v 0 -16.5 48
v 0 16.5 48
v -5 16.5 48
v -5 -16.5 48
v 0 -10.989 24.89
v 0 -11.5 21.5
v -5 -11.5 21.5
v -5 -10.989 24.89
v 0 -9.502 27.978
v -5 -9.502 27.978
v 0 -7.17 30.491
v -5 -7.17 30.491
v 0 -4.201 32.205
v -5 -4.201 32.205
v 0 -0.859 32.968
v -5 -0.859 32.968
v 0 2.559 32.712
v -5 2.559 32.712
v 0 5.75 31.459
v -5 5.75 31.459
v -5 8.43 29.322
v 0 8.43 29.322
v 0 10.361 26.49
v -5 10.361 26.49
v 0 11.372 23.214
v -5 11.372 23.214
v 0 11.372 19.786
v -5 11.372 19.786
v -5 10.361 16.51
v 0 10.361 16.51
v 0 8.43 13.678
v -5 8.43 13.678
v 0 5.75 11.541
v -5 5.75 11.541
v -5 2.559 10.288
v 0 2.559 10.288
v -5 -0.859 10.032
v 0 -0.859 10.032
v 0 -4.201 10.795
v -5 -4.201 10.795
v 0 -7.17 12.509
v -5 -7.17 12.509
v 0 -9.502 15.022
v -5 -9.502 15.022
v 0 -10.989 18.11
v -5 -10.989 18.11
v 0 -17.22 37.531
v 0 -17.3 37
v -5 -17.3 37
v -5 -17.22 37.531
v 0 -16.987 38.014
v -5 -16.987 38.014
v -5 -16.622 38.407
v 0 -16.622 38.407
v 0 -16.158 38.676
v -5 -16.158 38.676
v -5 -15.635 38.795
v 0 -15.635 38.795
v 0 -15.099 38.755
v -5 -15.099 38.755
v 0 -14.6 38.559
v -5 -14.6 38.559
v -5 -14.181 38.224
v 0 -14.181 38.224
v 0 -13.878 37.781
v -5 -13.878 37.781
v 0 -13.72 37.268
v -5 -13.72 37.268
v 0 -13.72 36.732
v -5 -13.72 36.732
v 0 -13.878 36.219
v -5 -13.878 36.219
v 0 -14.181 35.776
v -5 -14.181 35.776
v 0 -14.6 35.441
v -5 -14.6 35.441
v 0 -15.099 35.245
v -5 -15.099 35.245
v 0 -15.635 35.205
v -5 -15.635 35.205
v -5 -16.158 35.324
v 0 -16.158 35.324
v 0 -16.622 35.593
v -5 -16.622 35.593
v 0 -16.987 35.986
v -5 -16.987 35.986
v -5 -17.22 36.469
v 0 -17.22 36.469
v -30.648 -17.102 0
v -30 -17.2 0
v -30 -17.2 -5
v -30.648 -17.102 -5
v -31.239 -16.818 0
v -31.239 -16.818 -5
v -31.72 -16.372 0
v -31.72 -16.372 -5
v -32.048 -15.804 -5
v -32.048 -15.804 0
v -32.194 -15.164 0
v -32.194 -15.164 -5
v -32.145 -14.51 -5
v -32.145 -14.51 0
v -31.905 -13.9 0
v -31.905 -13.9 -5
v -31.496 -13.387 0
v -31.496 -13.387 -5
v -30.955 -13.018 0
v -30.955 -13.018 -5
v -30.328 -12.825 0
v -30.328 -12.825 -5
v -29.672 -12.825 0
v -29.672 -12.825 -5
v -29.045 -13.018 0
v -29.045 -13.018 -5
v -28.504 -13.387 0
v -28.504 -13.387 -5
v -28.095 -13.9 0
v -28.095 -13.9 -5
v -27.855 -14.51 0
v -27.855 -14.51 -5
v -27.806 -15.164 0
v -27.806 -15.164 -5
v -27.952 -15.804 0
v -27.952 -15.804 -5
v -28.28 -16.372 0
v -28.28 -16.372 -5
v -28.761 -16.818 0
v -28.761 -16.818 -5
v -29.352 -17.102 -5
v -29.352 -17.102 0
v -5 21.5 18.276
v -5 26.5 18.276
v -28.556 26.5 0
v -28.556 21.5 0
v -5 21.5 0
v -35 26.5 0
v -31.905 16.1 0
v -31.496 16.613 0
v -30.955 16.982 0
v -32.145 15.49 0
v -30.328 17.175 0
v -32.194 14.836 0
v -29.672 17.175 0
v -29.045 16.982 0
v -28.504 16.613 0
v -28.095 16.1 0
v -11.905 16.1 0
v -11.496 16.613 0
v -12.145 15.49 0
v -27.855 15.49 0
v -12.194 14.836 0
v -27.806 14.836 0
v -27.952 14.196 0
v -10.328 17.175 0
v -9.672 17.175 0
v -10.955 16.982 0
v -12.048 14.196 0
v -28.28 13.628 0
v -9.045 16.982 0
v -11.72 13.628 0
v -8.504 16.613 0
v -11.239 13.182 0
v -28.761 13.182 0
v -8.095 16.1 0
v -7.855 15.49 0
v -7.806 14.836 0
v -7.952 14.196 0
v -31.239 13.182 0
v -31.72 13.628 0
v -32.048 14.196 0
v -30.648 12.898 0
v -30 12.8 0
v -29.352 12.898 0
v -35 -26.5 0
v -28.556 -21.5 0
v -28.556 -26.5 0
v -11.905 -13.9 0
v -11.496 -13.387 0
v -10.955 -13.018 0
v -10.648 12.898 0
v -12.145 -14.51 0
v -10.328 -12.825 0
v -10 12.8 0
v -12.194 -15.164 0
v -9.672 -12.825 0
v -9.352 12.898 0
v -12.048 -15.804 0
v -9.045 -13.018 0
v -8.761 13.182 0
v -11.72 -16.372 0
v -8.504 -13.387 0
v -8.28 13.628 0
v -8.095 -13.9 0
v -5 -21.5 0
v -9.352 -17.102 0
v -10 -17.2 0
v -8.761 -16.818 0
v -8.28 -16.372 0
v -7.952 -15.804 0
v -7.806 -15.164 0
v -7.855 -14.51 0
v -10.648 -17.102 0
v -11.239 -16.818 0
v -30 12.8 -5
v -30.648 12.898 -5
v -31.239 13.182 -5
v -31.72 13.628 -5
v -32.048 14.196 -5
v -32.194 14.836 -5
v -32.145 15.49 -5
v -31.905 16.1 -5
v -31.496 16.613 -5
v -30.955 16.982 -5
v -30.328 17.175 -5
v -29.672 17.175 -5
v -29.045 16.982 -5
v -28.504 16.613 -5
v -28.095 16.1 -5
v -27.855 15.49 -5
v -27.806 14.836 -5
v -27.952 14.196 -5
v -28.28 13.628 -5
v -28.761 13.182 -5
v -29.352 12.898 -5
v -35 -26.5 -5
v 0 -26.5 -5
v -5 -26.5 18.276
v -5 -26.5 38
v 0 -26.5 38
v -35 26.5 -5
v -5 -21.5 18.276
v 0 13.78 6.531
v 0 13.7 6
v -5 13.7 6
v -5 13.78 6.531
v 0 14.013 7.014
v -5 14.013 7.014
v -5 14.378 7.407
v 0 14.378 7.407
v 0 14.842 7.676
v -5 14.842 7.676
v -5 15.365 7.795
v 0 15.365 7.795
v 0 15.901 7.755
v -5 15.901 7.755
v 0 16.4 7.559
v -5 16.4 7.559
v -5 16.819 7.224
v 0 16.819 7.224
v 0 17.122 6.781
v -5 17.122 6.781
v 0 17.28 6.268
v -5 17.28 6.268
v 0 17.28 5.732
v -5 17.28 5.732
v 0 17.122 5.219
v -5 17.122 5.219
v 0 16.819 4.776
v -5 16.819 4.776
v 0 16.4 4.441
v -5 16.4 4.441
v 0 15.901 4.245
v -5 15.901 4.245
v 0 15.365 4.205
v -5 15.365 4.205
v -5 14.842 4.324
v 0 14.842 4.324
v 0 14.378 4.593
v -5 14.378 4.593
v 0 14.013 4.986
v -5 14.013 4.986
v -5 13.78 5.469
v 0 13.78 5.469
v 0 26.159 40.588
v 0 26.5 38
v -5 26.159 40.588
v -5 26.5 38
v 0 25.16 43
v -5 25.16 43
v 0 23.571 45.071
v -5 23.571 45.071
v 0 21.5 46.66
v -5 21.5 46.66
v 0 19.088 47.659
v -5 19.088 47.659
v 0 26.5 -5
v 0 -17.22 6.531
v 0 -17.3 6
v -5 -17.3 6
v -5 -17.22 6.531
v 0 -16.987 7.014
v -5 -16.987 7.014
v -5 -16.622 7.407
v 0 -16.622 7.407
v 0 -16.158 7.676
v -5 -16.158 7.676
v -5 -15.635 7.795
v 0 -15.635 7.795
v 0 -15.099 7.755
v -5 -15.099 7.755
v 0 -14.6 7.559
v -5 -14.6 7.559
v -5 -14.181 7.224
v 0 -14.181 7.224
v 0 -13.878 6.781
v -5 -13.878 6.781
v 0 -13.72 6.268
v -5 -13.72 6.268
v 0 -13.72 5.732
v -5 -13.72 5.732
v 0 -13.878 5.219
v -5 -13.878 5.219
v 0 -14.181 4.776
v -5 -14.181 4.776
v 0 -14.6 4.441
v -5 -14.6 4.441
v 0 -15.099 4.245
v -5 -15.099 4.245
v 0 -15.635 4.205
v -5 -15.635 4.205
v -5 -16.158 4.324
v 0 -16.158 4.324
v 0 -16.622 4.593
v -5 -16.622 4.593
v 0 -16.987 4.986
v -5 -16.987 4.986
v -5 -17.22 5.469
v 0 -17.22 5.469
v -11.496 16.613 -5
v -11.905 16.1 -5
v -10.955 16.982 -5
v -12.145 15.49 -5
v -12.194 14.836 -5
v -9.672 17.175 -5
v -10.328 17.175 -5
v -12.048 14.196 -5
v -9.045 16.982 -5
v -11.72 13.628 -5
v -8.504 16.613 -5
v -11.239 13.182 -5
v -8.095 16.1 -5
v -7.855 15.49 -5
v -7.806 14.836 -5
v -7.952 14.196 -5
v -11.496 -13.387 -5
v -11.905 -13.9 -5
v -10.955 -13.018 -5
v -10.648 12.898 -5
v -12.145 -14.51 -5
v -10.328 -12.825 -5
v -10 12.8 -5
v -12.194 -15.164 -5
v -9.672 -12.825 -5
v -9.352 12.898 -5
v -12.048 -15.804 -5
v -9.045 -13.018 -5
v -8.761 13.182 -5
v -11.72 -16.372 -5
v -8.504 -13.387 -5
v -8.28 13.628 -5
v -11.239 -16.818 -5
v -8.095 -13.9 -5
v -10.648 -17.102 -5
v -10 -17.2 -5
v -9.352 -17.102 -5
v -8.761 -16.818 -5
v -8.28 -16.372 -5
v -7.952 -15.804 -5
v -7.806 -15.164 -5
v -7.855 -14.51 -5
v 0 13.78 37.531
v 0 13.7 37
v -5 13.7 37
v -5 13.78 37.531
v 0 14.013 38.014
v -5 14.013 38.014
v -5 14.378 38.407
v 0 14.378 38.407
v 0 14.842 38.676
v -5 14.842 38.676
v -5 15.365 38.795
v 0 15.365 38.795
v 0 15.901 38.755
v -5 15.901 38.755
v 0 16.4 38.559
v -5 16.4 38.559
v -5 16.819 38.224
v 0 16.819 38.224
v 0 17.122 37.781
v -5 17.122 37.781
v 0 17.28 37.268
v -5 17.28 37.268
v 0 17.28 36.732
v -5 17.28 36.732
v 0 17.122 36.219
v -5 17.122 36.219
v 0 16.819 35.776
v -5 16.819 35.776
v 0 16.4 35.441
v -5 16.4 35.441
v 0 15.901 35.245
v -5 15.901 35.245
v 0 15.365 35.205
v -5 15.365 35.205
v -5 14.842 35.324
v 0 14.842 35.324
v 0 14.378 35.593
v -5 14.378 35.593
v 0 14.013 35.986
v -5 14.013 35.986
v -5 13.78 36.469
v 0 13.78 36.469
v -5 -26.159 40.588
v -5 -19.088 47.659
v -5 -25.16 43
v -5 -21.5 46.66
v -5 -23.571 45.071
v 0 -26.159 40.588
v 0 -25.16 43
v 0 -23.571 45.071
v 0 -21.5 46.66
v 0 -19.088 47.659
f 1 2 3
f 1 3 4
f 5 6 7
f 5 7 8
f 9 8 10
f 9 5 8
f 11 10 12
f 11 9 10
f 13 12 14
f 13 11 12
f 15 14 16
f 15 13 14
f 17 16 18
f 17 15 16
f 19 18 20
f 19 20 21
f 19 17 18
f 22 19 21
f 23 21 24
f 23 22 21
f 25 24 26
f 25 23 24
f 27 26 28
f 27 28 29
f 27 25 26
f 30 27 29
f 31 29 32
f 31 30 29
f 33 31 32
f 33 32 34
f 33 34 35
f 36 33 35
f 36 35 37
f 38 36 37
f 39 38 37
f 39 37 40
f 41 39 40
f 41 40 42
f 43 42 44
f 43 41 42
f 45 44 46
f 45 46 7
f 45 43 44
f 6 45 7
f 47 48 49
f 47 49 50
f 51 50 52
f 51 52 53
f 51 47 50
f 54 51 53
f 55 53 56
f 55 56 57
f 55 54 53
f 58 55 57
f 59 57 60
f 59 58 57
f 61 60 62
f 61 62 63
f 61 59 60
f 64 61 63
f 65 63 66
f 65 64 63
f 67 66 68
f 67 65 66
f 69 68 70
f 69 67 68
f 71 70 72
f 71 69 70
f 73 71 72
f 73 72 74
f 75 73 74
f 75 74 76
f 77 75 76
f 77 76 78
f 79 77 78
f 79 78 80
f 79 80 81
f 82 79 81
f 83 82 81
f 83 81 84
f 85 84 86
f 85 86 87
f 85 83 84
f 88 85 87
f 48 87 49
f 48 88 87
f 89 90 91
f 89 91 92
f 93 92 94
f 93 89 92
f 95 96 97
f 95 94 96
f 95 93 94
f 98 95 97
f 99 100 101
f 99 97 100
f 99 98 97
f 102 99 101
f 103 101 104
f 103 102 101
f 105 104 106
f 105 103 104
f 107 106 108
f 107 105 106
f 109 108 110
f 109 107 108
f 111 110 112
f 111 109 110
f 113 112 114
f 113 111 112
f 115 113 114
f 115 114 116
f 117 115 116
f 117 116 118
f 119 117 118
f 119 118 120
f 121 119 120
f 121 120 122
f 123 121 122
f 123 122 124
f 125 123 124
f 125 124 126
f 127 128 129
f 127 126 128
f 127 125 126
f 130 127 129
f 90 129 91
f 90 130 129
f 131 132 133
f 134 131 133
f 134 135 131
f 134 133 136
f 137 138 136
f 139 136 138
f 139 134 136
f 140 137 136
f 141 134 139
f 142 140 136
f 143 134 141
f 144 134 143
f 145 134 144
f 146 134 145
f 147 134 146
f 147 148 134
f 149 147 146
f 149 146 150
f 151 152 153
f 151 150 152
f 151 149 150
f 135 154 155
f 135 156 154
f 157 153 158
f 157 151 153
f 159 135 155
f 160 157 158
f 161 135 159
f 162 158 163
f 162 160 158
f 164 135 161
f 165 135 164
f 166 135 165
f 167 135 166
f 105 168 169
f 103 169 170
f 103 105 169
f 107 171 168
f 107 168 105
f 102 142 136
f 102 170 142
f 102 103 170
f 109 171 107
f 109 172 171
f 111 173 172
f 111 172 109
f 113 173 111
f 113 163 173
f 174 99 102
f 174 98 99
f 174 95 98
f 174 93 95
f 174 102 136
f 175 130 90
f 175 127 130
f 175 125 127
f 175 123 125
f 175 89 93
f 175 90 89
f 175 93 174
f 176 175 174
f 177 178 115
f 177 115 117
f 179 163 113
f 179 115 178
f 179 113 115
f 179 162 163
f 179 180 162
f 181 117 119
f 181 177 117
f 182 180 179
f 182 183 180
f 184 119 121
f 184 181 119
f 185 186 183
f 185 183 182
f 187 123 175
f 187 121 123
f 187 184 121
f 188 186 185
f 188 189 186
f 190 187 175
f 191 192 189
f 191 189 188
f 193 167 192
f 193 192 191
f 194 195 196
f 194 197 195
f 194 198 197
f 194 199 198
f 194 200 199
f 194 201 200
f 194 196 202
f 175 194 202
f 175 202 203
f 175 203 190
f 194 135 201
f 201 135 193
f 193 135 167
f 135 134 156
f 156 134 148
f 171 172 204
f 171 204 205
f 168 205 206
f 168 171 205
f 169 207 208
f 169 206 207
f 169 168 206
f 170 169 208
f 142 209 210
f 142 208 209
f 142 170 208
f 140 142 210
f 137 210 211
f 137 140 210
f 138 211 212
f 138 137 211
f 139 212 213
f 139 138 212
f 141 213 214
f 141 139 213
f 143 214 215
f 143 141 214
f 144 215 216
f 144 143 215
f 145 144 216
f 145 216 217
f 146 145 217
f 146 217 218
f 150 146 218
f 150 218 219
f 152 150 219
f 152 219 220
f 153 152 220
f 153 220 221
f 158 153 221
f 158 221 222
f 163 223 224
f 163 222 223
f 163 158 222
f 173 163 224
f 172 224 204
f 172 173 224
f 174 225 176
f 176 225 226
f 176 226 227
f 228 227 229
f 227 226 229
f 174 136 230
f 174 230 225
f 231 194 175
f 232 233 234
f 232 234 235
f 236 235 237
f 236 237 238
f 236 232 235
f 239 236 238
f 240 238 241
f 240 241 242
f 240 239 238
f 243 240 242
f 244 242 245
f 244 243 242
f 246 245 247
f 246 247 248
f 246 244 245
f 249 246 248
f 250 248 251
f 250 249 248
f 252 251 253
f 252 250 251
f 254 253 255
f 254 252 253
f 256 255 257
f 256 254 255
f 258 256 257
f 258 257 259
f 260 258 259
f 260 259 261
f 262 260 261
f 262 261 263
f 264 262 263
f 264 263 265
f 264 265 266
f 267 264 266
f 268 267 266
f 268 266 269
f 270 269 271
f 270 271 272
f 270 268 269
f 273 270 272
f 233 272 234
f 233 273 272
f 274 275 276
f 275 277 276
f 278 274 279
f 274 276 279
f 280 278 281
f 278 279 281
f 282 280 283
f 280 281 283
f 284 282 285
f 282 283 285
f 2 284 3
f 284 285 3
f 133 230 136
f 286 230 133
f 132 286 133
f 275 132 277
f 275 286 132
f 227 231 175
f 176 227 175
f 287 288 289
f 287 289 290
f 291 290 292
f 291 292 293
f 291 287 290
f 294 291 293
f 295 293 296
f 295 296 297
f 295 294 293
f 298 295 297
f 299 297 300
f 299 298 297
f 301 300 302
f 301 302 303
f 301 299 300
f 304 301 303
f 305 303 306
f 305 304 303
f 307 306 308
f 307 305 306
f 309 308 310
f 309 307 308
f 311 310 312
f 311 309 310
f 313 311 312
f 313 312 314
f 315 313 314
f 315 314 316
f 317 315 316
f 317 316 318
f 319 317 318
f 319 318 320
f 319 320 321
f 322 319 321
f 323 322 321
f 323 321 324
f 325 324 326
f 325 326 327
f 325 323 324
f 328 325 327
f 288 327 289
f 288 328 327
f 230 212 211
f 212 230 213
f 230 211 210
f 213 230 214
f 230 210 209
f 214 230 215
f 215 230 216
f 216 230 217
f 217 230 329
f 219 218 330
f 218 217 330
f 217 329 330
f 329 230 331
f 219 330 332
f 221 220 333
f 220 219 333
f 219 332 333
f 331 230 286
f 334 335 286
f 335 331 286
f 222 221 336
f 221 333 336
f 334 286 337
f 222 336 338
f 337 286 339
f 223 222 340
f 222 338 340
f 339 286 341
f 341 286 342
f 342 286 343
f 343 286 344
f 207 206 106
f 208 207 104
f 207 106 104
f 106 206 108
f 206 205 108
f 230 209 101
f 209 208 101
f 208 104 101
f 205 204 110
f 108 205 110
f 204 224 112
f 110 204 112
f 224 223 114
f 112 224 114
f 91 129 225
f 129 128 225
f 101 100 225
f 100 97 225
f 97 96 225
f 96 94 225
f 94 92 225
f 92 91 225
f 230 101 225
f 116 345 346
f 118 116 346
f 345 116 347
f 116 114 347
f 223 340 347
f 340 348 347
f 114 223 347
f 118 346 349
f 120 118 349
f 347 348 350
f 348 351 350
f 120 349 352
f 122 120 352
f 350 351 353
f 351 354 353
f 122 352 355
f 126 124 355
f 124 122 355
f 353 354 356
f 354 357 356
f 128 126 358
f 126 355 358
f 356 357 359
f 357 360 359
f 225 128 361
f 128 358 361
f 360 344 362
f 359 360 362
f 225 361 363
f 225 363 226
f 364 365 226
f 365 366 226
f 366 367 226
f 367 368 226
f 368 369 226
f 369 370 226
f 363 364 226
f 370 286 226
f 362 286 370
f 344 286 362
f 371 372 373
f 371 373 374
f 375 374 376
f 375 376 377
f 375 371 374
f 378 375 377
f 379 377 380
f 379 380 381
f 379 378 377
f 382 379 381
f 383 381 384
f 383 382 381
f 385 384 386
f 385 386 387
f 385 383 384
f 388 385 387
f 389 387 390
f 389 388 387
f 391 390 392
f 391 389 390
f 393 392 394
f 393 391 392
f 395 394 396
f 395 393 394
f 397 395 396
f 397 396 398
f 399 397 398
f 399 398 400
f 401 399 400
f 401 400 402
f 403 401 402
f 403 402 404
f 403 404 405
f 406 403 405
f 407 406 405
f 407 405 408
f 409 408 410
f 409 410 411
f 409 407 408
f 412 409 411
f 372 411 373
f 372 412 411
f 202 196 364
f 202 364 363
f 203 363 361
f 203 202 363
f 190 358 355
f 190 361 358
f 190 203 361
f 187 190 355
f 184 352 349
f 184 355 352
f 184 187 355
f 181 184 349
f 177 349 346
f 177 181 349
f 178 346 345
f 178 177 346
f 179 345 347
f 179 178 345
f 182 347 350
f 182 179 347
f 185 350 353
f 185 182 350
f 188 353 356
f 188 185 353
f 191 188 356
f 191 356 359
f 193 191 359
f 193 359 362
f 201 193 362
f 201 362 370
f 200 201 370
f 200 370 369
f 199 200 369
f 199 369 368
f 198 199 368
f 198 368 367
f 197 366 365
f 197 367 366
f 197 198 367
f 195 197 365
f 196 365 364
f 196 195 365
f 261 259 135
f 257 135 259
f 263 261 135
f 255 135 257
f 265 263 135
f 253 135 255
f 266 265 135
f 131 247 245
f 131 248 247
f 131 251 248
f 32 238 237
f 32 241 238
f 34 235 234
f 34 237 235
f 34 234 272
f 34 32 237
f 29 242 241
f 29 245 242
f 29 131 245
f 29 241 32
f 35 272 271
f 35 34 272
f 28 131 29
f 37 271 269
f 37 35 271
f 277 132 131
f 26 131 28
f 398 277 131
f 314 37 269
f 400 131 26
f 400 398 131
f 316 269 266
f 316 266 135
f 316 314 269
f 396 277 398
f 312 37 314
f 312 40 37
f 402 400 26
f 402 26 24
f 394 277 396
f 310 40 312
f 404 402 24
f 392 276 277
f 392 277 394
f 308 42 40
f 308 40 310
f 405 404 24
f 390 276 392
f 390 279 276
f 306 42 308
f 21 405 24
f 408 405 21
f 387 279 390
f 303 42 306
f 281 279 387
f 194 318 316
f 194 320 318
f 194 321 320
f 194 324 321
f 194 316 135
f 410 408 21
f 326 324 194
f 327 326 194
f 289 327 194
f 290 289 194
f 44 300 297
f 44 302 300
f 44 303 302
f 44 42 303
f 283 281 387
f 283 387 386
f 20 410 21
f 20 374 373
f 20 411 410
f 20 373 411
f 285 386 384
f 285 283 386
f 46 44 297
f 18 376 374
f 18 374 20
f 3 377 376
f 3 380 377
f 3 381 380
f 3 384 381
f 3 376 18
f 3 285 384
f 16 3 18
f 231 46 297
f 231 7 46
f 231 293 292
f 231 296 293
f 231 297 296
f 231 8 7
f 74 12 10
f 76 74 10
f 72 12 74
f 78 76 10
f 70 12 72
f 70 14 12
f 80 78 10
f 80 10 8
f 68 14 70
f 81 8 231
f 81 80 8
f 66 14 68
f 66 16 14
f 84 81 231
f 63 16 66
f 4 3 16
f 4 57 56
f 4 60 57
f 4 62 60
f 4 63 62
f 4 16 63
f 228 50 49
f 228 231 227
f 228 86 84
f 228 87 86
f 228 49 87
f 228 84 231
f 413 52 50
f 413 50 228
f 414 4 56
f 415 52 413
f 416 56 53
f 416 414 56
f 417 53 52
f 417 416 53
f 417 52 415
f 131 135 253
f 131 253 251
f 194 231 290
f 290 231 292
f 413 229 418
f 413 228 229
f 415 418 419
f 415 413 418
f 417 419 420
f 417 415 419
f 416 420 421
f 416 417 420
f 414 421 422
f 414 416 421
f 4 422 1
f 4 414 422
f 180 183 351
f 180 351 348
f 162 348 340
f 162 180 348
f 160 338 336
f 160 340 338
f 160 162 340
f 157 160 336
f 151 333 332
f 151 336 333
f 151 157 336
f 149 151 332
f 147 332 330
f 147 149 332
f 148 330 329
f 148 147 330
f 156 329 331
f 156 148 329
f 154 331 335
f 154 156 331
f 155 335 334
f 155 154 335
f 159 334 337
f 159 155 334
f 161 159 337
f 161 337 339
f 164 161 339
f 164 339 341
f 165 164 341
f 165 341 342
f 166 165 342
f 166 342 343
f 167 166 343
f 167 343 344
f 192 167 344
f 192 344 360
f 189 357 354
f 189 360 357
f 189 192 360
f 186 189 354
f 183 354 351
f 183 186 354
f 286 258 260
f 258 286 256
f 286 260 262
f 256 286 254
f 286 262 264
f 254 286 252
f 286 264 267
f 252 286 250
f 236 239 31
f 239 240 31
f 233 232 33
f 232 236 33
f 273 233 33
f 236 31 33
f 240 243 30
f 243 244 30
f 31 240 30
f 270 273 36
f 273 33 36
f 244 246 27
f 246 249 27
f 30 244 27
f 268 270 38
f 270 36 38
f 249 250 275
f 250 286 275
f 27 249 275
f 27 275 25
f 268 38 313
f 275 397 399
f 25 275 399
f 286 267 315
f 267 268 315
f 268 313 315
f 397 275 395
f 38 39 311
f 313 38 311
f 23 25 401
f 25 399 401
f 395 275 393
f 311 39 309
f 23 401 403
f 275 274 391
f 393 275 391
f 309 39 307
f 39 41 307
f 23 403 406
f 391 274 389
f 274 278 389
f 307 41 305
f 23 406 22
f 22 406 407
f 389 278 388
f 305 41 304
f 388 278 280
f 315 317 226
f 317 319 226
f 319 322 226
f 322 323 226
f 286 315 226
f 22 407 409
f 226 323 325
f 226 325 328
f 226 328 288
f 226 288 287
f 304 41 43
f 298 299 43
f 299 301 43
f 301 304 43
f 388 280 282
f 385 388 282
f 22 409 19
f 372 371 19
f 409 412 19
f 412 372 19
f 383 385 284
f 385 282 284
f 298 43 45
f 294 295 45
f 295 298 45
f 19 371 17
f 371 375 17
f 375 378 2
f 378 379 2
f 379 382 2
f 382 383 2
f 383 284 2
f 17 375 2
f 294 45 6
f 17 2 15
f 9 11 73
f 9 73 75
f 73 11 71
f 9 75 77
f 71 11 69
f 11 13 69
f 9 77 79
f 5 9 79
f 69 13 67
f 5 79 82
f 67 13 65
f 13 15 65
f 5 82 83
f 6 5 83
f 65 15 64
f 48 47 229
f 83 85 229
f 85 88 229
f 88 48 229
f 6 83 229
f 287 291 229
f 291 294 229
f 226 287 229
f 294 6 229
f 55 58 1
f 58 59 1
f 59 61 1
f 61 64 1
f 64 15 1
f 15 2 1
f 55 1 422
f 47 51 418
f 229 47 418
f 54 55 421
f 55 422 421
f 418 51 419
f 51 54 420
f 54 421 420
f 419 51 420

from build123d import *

# Parameters (mm, degrees)
CYLINDER098_R          = 1.8
CYLINDER098_DEPTH      = 5
ARRAY001_X_COUNT       = 2
ARRAY001_X_PITCH       = 31
ARRAY001_Y_COUNT       = 2
ARRAY001_Y_PITCH       = 31
CYLINDER_R             = 2.2
CYLINDER_DEPTH         = 20
ARRAY_X_COUNT          = 2
ARRAY_X_PITCH          = 30
ARRAY_Y_COUNT          = 2
ARRAY_Y_PITCH          = 20
ARRAY_PLACEMENT_ANGLE  = 90
CYLINDER097_R          = 11.5
CYLINDER097_DEPTH      = 5
BOX006_W               = 53
BOX006_H               = 5
BOX006_DEPTH           = 30
BOX005_W               = 53
BOX005_H               = 53
BOX005_DEPTH           = 5
FILLET001_R            = 10
PAD001_DEPTH           = 5
ARRAY002_X_COUNT       = 2
ARRAY002_X_PITCH       = 48
CUT004_ROLL_ANGLE      = 90
CUT004_PLACEMENT_ANGLE = -90


with BuildPart() as stepper_bolt_hole_array:
    # Cylinder098 → Cylinder098 (new body)
    with BuildSketch(Plane.XY):
        Circle(CYLINDER098_R)
    extrude(amount=CYLINDER098_DEPTH)

    # Array001 X: stepper bolt hole array ×2


with BuildPart() as stepper_bolt_hole_array_1:
    add(stepper_bolt_hole_array.part)
    with Locations(*[(i * ARRAY001_X_PITCH, 0, 0) for i in range(1, ARRAY001_X_COUNT)]):
        add(stepper_bolt_hole_array.part)

    # Array001 Y: stepper bolt hole array ×2


with BuildPart() as stepper_bolt_hole_array_2:
    add(stepper_bolt_hole_array_1.part)
    with Locations(*[(0, i * ARRAY001_Y_PITCH, 0) for i in range(1, ARRAY001_Y_COUNT)]):
        add(stepper_bolt_hole_array_1.part)


with BuildPart() as stepper_bolt_hole_array_3:
    # Array001 placement: moved
    add(stepper_bolt_hole_array_2.part.moved(Location((-15.5, -15.5, 0))))


with BuildPart() as insert_hole_array:
    # Cylinder → Cylinder (new body)
    with BuildSketch(Plane.XY.offset(-3)):
        Circle(CYLINDER_R)
    extrude(amount=CYLINDER_DEPTH)

    # Array X: insert hole array ×2


with BuildPart() as insert_hole_array_1:
    add(insert_hole_array.part)
    with Locations(*[(i * ARRAY_X_PITCH, 0, 0) for i in range(1, ARRAY_X_COUNT)]):
        add(insert_hole_array.part)

    # Array Y: insert hole array ×2


with BuildPart() as insert_hole_array_2:
    add(insert_hole_array_1.part)
    with Locations(*[(0, i * ARRAY_Y_PITCH, 0) for i in range(1, ARRAY_Y_COUNT)]):
        add(insert_hole_array_1.part)


with BuildPart() as insert_hole_array_3:
    # Array placement: moved
    add(insert_hole_array_2.part.moved(Location((-15, -20.5, 10))).rotate(Axis((-15, -20.5, 10), (1, 0, 0)), ARRAY_PLACEMENT_ANGLE))


with BuildPart() as stepper_mount_holes:
    # Cylinder097 → Cylinder097 (new body)
    with BuildSketch(Plane.XY):
        Circle(CYLINDER097_R)
    extrude(amount=CYLINDER097_DEPTH)

    # Fusion006: union stepper bolt hole array, insert hole array
    add(stepper_bolt_hole_array_3.part)
    add(insert_hole_array_3.part)


with BuildPart() as stepper_mount_bottom:
    # Box006 → Box006 (new body)
    with BuildSketch(Plane(origin=(-26.5, -26.5, 5), x_dir=(1, 0, 0), z_dir=(0, 0, 1))):
        with Locations((26.5, 2.5)):
            Rectangle(BOX006_W, BOX006_H)
    extrude(amount=BOX006_DEPTH)


with BuildPart() as stepper_mount_cube_fillet:
    # Box005 → Box005 (new body)
    with BuildSketch(Plane(origin=(-26.5, -26.5, 0), x_dir=(1, 0, 0), z_dir=(0, 0, 1))):
        with Locations((26.5, 26.5)):
            Rectangle(BOX005_W, BOX005_H)
    extrude(amount=BOX005_DEPTH)

    # Fillet001
    fillet001_edges = [stepper_mount_cube_fillet.edges().sort_by_distance(p)[0] for p in [
        (-26.5, 26.5, 2.5),
        (26.5, 26.5, 2.5),
    ]]
    fillet(fillet001_edges, radius=FILLET001_R)


with BuildPart() as stepper_mount_cut:
    # Sketch001 → Pad001 (new body)
    with BuildSketch(Plane.YZ):
        Polygon((-26.5, 5), (-3.224222, 5), (-26.5, 35), align=None)
    extrude(amount=PAD001_DEPTH)

    # Array002 X: stepper mount cut ×2


with BuildPart() as stepper_mount_cut_1:
    add(stepper_mount_cut.part)
    with Locations(*[(i * ARRAY002_X_PITCH, 0, 0) for i in range(1, ARRAY002_X_COUNT)]):
        add(stepper_mount_cut.part)


with BuildPart() as stepper_mount_cut_2:
    # Array002 placement: moved
    add(stepper_mount_cut_1.part.moved(Location((-26.5, 0, 0))))

    # Fusion007: union stepper mount bottom, stepper mount cube fillet
    add(stepper_mount_bottom.part)
    add(stepper_mount_cube_fillet.part)

    # Cut004: cut stepper mount holes
    add(stepper_mount_holes.part, mode=Mode.SUBTRACT)


with BuildPart() as stepper_mount_cut_3:
    # Cut004 roll: moved
    add(stepper_mount_cut_2.part.rotate(Axis((0, 0, 0), (1, 0, 0)), CUT004_ROLL_ANGLE))


with BuildPart() as stepper_mount_cut_4:
    # Cut004 placement: moved
    add(stepper_mount_cut_3.part.moved(Location((0, 0, 21.5))).rotate(Axis((0, 0, 21.5), (0, 0, 1)), CUT004_PLACEMENT_ANGLE))


solid = stepper_mount_cut_4.part
